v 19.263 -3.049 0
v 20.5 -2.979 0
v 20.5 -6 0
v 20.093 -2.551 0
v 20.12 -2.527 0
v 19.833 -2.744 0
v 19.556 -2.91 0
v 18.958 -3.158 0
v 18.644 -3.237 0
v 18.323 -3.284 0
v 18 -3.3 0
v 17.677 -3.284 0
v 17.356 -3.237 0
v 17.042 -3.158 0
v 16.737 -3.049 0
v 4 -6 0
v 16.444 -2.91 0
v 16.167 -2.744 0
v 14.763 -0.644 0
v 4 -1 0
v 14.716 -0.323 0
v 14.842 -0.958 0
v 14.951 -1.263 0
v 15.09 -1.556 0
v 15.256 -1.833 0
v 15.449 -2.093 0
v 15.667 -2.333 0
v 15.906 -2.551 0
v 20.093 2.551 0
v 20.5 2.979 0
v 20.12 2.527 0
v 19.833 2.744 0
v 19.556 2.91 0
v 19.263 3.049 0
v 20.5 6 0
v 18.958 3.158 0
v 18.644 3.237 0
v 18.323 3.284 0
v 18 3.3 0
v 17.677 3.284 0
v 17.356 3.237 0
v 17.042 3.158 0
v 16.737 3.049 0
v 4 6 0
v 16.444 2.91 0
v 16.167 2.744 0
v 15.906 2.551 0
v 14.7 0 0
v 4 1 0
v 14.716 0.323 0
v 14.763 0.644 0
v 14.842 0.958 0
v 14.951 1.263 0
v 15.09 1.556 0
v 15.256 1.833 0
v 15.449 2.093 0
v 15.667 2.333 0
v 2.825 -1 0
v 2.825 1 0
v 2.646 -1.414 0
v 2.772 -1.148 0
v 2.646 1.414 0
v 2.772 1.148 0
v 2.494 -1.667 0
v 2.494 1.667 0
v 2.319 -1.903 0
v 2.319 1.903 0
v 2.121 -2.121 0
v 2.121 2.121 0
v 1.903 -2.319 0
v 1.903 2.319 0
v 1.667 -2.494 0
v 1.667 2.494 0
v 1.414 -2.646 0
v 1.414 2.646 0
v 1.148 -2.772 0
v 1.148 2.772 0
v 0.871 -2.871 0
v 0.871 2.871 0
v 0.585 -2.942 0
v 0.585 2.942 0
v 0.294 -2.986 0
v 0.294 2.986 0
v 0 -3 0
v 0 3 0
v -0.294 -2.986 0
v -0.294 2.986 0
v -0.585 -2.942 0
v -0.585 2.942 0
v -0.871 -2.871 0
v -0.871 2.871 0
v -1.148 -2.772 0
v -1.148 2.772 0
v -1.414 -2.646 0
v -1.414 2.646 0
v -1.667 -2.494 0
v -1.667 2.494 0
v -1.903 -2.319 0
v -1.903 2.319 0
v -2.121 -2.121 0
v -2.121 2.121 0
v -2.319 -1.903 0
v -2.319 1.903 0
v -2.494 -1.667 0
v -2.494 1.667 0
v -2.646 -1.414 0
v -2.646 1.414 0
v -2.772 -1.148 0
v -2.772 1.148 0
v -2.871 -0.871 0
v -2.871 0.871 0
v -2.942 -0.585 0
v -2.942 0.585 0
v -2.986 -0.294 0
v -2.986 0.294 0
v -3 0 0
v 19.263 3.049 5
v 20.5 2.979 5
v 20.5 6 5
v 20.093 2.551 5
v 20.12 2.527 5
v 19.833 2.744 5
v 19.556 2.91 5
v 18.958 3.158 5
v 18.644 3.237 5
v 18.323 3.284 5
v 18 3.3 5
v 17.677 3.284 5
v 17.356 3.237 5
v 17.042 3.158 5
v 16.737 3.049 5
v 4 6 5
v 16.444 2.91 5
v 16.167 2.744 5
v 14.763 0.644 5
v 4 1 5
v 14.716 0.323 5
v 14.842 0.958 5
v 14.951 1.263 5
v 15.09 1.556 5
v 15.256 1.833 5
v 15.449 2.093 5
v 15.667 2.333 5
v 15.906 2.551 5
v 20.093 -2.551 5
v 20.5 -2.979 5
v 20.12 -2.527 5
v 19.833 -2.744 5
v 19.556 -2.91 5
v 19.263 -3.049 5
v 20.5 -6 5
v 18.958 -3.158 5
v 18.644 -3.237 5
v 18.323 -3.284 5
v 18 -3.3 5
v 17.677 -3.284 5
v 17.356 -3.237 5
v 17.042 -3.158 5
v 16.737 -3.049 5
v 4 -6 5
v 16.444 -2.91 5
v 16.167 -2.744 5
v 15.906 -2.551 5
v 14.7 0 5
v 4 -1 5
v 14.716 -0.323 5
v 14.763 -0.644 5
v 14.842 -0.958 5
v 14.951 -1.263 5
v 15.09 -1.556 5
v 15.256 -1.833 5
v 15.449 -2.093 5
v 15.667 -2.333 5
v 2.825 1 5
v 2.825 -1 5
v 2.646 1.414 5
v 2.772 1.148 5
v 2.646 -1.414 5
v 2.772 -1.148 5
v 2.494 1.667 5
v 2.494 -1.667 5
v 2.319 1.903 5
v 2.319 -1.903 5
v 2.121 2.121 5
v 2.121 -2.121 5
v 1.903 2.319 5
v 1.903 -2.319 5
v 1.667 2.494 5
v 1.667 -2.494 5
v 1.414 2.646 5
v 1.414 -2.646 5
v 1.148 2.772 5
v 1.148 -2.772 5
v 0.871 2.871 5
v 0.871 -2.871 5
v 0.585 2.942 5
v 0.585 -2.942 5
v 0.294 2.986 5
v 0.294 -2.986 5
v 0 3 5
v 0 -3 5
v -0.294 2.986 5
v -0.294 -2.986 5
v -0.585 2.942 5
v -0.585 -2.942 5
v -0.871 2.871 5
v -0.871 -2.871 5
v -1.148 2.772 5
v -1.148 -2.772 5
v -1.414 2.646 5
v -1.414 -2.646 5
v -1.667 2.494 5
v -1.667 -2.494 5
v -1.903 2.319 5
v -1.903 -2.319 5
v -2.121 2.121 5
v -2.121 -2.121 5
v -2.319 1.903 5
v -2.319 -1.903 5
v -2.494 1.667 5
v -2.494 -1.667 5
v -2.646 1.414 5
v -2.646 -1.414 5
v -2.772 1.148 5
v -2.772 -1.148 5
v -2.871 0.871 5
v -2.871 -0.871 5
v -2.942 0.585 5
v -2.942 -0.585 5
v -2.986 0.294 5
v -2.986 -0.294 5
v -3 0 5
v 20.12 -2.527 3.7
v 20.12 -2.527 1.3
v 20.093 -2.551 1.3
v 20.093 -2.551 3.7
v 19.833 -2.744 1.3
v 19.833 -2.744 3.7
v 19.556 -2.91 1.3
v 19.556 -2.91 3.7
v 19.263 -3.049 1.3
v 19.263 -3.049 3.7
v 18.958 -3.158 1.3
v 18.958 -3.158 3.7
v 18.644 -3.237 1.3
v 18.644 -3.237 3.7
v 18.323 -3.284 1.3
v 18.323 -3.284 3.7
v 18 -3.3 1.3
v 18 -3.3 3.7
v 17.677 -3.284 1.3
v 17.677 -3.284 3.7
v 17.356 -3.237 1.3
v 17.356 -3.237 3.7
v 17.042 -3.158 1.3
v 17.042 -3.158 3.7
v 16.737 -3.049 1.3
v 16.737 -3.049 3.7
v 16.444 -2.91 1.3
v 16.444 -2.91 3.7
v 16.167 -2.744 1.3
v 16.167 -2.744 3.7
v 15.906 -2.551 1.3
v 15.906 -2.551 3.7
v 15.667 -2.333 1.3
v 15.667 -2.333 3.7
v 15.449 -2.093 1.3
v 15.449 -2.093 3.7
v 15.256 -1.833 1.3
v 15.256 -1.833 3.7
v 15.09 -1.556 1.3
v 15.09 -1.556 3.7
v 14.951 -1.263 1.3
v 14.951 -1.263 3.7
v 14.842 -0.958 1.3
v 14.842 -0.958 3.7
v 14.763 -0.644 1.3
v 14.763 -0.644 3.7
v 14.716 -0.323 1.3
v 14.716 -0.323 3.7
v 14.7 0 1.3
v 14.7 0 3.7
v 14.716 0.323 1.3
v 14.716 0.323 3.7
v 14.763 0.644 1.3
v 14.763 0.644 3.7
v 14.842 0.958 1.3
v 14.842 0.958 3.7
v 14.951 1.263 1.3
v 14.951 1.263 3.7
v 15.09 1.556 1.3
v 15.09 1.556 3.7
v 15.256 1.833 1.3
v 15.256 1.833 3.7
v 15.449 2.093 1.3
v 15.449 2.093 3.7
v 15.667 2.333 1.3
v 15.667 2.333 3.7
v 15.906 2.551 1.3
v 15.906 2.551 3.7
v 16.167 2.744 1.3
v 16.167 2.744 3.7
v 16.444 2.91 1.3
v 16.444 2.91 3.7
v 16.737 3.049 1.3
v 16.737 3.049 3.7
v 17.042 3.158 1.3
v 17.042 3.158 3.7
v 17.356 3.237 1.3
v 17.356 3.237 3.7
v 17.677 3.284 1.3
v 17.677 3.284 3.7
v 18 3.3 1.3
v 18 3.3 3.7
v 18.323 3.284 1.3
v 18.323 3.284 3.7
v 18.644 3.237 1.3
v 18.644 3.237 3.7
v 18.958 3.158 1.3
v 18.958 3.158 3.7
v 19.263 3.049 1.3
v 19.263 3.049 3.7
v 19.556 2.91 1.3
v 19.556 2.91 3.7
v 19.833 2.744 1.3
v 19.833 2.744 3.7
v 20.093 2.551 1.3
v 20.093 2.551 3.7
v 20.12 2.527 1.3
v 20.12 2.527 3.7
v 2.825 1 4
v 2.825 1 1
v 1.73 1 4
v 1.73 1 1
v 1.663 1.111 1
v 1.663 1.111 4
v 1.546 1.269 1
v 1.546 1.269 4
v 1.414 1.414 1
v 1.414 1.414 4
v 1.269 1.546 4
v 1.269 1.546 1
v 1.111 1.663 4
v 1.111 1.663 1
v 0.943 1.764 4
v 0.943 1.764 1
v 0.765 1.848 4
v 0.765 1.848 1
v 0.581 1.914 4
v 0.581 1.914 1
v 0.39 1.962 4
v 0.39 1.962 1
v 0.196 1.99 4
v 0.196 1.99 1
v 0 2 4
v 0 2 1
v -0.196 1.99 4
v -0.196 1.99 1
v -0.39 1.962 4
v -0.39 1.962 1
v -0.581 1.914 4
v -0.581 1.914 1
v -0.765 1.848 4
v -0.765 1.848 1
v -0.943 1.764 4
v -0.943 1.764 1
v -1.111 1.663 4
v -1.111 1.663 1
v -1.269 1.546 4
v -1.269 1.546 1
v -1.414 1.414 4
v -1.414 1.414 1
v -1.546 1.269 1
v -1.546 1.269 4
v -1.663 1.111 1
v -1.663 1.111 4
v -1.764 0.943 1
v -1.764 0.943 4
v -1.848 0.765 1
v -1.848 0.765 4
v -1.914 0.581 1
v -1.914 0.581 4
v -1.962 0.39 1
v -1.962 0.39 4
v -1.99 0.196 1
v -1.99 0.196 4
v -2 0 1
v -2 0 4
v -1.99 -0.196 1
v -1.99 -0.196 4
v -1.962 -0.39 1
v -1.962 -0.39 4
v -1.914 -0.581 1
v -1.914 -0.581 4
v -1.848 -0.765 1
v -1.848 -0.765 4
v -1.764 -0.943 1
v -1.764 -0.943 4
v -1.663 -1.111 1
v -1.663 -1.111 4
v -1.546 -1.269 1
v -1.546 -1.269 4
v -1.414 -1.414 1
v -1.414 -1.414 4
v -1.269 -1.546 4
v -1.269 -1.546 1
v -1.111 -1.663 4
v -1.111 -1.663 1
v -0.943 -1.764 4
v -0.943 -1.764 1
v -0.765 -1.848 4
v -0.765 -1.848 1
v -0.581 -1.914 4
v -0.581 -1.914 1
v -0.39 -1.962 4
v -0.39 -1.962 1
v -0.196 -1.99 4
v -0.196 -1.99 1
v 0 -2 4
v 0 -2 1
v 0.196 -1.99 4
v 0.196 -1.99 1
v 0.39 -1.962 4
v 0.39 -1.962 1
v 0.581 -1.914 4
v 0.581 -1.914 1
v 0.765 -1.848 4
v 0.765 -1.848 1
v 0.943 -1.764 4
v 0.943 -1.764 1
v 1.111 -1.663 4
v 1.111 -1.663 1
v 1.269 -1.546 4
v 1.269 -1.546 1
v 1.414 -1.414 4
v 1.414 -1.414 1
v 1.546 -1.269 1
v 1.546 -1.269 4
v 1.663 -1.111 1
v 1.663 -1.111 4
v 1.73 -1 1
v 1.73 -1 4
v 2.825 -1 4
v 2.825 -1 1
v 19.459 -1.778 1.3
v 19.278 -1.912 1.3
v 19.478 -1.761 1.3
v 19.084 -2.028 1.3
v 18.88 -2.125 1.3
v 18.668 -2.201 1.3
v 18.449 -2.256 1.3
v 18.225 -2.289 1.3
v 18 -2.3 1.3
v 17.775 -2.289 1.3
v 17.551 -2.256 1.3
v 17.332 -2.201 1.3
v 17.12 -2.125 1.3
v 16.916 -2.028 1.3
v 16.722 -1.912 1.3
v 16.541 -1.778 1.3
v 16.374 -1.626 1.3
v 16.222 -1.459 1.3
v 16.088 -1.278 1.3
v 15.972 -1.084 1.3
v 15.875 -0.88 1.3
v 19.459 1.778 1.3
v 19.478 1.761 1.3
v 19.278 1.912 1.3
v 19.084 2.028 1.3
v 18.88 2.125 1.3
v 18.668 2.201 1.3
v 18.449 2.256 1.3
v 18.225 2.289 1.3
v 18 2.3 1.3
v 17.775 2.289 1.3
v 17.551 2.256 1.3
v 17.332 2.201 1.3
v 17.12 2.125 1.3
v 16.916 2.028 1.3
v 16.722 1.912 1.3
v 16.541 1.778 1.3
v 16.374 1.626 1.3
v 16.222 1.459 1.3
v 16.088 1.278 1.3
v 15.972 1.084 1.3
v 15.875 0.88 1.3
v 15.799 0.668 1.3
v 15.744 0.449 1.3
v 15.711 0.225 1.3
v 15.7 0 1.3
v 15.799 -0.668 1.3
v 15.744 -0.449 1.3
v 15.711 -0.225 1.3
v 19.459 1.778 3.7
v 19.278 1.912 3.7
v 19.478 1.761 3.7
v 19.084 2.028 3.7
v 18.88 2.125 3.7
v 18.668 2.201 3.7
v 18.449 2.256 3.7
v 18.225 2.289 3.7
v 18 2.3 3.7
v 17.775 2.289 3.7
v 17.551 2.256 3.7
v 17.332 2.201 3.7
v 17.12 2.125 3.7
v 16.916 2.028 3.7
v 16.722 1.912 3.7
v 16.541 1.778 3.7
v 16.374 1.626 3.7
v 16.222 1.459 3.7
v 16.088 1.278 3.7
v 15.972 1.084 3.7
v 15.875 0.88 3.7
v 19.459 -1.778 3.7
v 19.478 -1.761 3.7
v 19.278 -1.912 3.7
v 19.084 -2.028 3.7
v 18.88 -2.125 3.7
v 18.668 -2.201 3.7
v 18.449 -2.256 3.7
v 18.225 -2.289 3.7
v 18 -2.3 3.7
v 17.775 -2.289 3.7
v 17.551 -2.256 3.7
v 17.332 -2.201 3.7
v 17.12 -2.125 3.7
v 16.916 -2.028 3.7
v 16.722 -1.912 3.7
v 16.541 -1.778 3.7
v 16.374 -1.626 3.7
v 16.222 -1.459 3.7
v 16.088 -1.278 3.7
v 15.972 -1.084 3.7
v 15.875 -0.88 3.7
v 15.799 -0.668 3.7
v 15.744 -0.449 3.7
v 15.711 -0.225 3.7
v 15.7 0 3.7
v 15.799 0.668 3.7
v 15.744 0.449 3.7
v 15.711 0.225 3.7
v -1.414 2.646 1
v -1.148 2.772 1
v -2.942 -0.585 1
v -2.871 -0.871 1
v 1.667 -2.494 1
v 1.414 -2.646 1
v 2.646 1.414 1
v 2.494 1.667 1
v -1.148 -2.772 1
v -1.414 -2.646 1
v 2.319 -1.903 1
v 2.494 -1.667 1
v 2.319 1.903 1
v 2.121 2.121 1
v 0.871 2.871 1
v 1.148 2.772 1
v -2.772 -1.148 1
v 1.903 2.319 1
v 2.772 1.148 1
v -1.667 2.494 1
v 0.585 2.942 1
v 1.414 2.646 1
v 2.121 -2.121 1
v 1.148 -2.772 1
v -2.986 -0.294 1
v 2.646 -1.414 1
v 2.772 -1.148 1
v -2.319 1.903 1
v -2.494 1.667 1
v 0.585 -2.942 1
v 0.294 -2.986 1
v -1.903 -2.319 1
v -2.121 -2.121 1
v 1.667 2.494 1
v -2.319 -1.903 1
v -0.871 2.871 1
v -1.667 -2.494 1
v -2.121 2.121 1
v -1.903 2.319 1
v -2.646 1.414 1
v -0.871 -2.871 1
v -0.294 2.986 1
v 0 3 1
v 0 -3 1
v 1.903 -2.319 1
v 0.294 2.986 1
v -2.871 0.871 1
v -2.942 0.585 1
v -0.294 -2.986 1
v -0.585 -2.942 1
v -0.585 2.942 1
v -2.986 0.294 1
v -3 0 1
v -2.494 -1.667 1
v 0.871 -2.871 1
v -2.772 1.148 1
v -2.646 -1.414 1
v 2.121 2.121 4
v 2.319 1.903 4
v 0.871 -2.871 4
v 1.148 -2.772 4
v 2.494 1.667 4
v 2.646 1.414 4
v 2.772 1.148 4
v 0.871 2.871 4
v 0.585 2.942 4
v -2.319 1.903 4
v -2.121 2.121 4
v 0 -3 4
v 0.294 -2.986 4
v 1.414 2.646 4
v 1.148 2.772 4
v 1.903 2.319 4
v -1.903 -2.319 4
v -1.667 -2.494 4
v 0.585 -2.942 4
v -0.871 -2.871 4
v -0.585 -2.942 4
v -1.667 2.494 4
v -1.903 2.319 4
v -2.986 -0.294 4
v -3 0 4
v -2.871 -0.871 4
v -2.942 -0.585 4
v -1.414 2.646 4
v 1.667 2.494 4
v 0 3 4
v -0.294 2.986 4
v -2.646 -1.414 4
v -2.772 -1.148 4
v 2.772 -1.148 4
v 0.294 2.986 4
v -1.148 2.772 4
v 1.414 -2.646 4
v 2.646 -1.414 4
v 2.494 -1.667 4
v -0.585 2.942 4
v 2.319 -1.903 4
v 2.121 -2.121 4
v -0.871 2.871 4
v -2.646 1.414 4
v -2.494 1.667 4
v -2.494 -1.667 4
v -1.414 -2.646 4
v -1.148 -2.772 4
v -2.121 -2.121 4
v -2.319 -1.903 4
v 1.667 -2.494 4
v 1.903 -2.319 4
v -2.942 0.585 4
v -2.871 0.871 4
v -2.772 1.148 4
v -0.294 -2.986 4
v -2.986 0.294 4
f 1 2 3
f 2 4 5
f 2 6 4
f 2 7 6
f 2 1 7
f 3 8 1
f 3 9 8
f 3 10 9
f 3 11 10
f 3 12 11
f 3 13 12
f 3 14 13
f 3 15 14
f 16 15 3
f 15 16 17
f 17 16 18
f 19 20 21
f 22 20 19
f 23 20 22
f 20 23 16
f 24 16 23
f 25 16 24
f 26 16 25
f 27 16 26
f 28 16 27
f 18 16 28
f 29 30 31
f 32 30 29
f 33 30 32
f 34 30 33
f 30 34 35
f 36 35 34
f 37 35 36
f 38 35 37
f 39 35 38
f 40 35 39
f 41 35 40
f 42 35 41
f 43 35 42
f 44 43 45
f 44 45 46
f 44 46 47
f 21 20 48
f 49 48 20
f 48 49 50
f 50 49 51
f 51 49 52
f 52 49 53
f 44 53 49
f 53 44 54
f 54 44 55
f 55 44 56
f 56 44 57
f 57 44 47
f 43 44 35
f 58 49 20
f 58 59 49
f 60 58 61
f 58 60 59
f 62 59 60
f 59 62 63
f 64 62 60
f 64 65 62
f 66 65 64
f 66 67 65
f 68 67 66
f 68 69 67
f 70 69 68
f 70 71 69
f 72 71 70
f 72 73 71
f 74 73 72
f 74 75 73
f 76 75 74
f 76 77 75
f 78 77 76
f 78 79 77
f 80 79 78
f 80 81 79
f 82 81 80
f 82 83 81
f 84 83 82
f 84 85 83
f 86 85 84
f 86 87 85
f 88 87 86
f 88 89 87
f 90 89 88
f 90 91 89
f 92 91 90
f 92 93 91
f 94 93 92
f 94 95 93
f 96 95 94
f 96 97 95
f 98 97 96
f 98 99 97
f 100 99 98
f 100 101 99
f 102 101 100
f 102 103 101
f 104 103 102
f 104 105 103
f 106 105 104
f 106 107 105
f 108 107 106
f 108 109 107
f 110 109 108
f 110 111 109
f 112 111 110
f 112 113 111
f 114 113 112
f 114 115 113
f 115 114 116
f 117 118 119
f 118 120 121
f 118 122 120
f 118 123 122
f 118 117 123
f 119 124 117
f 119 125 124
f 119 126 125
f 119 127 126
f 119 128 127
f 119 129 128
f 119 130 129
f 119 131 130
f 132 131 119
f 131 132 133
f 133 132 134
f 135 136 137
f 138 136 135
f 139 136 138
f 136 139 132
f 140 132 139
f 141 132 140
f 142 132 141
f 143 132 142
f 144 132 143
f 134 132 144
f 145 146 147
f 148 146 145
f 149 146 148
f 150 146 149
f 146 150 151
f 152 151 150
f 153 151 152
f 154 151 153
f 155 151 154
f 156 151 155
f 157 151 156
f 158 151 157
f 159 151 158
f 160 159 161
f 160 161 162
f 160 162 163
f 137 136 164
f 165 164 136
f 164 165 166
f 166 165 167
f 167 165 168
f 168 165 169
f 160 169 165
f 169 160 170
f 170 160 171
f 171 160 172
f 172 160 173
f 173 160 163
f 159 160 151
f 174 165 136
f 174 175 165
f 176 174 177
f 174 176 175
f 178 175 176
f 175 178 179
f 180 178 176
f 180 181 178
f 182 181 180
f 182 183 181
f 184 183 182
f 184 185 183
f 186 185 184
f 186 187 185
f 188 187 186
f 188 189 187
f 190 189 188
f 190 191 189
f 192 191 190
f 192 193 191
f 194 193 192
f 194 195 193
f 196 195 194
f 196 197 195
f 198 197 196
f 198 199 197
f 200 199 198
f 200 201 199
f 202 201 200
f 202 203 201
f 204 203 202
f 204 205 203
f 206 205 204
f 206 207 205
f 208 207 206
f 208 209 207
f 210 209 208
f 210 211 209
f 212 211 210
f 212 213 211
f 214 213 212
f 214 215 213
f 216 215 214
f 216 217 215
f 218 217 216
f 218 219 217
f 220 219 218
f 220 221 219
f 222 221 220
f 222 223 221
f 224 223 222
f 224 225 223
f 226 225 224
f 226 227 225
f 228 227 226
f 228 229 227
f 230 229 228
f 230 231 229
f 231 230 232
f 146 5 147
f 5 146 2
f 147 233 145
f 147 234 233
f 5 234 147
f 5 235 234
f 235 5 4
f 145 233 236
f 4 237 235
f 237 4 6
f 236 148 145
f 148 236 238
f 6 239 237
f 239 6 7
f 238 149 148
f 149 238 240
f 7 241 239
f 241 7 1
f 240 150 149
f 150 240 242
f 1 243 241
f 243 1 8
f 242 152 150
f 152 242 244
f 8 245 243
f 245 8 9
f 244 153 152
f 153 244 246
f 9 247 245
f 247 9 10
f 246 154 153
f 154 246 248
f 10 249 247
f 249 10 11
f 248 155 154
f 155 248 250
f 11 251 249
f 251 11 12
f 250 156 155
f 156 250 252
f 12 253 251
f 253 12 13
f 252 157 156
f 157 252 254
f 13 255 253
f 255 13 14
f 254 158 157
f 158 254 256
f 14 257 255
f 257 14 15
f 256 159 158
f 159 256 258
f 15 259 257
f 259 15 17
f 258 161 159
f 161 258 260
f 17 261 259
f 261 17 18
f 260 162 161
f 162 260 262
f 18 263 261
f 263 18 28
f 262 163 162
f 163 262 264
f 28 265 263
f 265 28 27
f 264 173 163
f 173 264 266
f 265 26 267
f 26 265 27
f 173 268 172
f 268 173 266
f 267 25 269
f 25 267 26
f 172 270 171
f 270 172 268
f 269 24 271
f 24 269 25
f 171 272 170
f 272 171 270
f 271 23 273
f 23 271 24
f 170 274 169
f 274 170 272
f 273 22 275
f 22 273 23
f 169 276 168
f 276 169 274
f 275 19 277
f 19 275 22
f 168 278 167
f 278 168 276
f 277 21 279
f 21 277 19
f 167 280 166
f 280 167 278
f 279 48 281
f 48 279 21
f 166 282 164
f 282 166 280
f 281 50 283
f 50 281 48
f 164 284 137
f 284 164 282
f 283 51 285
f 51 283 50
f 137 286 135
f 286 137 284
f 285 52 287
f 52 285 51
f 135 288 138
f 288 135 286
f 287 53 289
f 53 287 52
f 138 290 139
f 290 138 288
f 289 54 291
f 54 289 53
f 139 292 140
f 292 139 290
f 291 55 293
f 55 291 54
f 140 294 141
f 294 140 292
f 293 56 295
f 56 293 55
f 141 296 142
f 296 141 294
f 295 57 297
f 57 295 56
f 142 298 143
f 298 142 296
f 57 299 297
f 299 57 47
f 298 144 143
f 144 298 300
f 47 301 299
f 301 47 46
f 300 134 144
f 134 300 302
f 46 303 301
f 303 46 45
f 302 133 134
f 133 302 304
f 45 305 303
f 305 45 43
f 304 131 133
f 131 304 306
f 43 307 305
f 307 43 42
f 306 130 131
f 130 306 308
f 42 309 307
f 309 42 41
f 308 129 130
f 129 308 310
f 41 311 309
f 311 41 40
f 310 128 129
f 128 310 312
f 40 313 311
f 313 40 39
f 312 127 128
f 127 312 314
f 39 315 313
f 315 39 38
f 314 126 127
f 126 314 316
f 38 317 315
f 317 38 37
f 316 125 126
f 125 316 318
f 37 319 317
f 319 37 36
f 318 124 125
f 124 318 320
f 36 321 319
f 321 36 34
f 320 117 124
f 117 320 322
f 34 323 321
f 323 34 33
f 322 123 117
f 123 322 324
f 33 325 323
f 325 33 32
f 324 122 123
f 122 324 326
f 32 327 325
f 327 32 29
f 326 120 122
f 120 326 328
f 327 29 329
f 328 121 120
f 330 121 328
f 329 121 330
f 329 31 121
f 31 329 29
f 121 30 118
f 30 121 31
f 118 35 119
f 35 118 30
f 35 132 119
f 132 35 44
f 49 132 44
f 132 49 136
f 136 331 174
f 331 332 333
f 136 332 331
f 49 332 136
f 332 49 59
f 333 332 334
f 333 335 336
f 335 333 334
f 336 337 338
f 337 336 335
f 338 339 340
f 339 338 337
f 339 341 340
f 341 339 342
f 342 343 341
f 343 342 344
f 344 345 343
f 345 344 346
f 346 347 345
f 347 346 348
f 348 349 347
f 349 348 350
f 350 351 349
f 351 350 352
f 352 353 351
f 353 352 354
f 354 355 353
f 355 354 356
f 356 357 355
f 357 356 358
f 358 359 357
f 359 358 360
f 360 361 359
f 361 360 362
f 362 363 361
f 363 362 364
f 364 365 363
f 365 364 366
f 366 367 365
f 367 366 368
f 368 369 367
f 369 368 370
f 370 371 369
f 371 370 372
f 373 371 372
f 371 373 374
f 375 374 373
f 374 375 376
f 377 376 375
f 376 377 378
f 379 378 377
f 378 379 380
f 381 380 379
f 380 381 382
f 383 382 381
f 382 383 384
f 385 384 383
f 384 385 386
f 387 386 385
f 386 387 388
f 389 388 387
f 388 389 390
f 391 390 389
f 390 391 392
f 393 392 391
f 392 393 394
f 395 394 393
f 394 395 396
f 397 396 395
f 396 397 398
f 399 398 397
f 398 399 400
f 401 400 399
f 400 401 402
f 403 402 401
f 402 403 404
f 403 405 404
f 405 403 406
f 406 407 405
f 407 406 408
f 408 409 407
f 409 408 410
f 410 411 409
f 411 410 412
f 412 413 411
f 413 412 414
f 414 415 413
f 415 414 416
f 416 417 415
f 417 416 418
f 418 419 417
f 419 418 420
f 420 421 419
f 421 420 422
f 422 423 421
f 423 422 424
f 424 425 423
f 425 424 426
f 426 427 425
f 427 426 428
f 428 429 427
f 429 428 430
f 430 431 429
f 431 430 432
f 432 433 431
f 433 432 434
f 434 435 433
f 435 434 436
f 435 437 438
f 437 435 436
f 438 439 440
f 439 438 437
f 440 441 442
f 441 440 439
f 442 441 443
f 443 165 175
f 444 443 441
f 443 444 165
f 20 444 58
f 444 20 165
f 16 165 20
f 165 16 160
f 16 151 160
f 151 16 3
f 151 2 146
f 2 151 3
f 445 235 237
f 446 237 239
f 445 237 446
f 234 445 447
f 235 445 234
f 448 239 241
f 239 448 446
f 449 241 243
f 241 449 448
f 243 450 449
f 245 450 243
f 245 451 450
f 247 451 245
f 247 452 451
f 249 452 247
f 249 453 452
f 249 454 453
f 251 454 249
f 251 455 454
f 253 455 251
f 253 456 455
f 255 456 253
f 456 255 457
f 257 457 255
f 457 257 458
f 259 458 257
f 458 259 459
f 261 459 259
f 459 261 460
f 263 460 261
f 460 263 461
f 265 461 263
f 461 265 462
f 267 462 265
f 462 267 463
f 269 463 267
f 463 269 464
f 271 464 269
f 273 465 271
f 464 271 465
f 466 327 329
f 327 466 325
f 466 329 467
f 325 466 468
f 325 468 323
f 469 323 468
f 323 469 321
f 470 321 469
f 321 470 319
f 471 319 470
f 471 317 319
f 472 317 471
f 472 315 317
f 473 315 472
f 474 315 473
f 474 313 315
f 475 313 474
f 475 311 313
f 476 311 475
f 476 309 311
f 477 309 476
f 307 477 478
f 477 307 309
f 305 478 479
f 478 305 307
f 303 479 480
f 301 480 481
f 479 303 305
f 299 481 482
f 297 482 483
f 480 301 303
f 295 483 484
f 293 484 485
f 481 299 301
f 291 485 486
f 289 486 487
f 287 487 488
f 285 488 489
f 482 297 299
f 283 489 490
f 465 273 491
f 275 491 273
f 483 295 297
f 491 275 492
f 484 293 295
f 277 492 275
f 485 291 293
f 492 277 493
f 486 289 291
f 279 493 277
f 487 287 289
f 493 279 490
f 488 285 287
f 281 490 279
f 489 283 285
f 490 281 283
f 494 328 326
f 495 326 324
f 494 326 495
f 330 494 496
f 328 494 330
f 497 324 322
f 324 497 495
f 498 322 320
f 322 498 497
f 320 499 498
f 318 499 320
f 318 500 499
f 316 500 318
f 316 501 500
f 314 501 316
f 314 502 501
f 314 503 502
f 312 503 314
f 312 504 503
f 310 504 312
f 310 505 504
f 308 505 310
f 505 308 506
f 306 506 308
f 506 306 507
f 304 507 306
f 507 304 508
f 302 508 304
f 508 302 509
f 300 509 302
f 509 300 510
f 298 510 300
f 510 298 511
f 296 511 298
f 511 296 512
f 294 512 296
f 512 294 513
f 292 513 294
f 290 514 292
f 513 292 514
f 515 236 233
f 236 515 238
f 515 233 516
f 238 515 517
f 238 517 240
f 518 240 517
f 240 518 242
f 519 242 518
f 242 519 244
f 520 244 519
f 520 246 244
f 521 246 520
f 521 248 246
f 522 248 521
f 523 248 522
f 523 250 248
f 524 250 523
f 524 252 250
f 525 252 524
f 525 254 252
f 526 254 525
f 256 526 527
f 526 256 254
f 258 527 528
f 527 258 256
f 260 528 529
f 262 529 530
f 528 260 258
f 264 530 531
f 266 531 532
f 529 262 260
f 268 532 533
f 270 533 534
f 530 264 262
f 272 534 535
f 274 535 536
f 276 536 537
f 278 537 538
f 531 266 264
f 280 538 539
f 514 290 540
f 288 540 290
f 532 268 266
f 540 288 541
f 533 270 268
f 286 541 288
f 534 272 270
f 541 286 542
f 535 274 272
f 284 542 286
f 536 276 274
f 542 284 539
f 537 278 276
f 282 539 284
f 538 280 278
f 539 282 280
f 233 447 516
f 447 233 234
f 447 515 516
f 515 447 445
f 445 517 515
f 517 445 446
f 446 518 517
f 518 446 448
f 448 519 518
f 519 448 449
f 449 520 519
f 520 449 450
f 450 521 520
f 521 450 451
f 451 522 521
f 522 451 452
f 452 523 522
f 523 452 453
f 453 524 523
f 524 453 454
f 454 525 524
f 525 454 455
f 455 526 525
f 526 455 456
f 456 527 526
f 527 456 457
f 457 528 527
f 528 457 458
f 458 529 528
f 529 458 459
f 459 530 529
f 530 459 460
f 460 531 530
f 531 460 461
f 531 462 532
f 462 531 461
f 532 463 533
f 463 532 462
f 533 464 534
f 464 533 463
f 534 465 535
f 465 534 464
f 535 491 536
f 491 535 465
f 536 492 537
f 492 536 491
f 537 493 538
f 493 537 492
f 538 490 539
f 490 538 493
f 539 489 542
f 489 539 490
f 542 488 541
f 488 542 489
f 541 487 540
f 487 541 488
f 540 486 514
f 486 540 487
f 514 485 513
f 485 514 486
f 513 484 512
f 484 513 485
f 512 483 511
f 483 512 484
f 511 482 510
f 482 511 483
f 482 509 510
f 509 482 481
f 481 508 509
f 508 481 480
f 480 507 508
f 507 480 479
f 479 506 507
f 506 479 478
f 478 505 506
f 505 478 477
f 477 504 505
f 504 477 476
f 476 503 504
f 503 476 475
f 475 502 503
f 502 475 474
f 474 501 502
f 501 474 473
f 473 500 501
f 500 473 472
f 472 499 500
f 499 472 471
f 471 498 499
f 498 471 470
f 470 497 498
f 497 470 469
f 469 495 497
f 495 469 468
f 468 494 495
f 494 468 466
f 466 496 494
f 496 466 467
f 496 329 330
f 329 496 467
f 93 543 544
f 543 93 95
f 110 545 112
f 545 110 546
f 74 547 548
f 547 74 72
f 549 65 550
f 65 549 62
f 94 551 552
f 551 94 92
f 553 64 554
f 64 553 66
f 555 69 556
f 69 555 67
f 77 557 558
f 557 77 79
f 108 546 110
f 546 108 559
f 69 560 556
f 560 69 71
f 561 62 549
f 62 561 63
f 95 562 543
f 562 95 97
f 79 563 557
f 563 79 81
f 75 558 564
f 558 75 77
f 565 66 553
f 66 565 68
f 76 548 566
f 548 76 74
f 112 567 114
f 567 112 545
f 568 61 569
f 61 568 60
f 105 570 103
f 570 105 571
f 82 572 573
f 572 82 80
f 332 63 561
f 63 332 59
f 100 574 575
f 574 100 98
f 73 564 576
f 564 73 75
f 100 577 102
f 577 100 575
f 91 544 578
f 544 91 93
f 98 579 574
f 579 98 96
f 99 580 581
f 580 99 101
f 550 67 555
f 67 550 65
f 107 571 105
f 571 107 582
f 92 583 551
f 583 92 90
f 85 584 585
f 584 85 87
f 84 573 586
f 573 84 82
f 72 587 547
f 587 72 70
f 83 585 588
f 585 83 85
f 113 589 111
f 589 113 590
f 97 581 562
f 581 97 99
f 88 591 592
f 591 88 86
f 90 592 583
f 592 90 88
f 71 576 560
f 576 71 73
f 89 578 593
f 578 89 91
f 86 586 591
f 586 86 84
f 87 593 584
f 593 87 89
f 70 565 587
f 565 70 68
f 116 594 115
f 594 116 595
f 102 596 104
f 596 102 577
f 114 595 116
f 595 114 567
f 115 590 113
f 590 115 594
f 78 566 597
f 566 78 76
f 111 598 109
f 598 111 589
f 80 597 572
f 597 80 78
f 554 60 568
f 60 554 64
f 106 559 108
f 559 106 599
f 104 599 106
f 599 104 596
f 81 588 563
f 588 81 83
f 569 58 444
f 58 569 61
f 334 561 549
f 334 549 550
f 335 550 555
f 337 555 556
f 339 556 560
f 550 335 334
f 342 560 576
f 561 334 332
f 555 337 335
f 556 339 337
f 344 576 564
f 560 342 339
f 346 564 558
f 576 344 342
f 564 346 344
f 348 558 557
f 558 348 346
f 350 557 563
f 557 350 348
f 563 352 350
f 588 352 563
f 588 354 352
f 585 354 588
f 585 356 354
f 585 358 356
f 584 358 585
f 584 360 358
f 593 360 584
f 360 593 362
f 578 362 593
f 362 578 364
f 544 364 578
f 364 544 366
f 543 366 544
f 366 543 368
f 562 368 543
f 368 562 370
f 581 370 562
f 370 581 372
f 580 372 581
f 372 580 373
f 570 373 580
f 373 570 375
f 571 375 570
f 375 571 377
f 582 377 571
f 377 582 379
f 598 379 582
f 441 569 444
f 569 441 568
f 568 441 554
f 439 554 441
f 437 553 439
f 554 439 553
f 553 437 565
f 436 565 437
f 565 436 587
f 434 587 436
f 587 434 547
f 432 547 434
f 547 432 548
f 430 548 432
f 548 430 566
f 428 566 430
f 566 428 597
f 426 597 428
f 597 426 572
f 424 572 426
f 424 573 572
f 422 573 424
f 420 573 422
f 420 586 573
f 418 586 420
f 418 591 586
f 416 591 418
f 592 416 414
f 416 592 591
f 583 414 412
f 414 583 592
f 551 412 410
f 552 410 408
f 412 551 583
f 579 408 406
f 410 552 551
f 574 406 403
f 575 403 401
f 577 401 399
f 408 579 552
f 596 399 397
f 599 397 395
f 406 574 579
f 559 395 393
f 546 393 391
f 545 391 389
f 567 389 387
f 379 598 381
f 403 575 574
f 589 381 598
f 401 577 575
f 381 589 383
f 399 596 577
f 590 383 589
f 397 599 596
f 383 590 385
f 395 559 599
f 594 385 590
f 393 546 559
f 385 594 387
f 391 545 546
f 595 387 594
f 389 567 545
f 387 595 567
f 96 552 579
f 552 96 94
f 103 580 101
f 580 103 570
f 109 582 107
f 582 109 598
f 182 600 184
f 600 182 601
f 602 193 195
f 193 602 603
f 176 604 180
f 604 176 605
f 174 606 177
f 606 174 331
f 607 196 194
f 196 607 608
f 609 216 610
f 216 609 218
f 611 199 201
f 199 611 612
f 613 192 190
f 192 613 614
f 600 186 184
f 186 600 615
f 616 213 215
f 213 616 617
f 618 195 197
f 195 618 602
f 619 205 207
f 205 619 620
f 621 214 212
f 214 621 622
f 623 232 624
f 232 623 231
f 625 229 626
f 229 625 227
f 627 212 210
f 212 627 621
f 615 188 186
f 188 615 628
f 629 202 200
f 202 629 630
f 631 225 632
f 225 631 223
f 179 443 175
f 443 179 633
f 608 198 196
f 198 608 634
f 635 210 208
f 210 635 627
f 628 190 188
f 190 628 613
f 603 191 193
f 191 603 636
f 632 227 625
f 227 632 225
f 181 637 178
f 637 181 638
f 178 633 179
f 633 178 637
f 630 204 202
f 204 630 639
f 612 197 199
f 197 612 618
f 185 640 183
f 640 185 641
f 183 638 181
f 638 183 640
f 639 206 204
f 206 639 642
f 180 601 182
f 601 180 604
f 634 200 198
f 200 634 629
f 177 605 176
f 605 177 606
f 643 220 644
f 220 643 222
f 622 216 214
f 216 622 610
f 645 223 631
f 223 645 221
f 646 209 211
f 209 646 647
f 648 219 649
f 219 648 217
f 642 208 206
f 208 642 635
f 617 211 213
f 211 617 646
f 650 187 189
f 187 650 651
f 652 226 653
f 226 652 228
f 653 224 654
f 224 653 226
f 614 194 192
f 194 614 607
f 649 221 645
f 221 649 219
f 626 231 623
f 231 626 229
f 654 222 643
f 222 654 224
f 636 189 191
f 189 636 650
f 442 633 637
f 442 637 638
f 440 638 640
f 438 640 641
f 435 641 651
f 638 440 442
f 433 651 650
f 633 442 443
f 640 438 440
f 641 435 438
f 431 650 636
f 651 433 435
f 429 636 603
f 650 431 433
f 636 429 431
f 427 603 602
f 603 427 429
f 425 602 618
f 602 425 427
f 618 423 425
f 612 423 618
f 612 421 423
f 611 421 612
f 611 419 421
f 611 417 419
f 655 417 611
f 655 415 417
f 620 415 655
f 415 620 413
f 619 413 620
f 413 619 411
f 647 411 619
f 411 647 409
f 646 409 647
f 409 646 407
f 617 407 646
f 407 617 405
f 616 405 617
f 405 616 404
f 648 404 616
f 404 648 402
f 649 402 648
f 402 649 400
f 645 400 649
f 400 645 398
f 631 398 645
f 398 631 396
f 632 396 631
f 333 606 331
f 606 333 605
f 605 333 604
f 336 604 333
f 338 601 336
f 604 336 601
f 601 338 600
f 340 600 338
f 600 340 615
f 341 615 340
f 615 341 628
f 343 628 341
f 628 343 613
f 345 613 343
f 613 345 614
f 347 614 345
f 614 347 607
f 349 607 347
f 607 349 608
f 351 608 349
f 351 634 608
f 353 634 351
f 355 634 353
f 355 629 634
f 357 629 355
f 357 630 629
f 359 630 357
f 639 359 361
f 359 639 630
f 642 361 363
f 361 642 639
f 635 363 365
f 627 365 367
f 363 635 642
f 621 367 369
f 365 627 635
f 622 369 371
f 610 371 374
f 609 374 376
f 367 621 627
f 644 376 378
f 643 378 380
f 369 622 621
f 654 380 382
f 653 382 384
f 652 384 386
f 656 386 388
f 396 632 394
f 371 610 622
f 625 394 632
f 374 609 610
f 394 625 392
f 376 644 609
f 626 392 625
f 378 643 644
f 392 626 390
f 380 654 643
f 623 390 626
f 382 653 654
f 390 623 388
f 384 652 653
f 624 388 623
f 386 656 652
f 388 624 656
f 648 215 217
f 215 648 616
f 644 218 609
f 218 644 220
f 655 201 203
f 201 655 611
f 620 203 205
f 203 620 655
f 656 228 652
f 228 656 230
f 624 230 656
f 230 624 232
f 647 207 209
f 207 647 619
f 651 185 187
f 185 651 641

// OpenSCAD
part = "link"; // [link, assembly]
cadverify_only = "";
module instance(name, part, unit = 1) {
    echo(cadverify_instance = [name, part, unit]);
    if (cadverify_only == "" || cadverify_only == name) children();
}

// Parameters (mm)
pitch = 18;          // pin-to-bore distance
link_w = 12;         // width (Y)
link_t = 5;          // thickness (Z)
pin_d = 4;           // pin shaft diameter
bore_d = 4.6;        // bore diameter (0.3 radial clearance)
cap_d = 6;           // cap diameter
cap_h = 1;           // cap thickness
gap_z = 0.3;         // vertical clearance cap<->knuckle
kn_h = 2.4;          // knuckle height = 5-2*1-2*0.3
kn_out_d = 7.6;      // knuckle outer diameter (1.5 wall)
cap_cav_d = 6.6;     // cap cavity diameter (0.3 radial clearance)
neck_w = 2;          // neck width
slot_half = 50;      // slot half-angle (deg), allows +-30 deg swing
yoke_east = 20.5;    // full-height yoke east extent (local X)
$fn = 64;

module link_geom() {
    bore_x = pitch;
    cap_r = cap_d/2;
    cav_r = cap_cav_d/2;
    pin_r = pin_d/2;
    bore_r = bore_d/2;
    kn_out_r = kn_out_d/2;
    // far points for slot wedge (full height + middle)
    // wedge from bore center to the east, half-angle slot_half
    wedge_far = 30;
    dy_far = wedge_far * tan(slot_half);
    // ---- full height (0..5): yoke + neck + pin shaft ----
    linear_extrude(height = link_t, convexity = 8) {
        difference() {
            union() {
                // pin shaft disc
                translate([0,0]) circle(r = pin_r);
                // neck rect X[0,5] Y[-1,1]
                translate([0,-neck_w/2]) square([5, neck_w]);
                // yoke base rect X[4,yoke_east] Y[-6,6]
                translate([4,-link_w/2]) square([yoke_east-4, link_w]);
            }
            // cap cavity (for next link caps)
            translate([bore_x,0]) circle(r = cav_r);
            // slot wedge for next-link neck swing (full height)
            polygon(points = [[bore_x,0],[bore_x+wedge_far, dy_far],[bore_x+wedge_far, -dy_far]]);
        }
    }
    // ---- middle knuckle ring (1.3..3.7) ----
    kn_bot = cap_h + gap_z; // 1.3
    translate([0,0,kn_bot])
    linear_extrude(height = kn_h, convexity = 8) {
        difference() {
            translate([bore_x,0]) circle(r = kn_out_r);
            translate([bore_x,0]) circle(r = bore_r);
            polygon(points = [[bore_x,0],[bore_x+wedge_far, dy_far],[bore_x+wedge_far, -dy_far]]);
        }
    }
    // ---- caps ----
    translate([0,0,0]) cylinder(h = cap_h, r = cap_r);
    translate([0,0,link_t-cap_h]) cylinder(h = cap_h, r = cap_r);
}

if (part == "assembly") {
    instance("link1", "link", 1) translate([0,0,0]) link_geom();
    instance("link2", "link", 1) translate([18,0,0]) link_geom();
    instance("link3", "link", 1) translate([36,0,0]) link_geom();
    echo(cadverify_spec = [
        ["bounds", [[-3, -6, 0], [56.5, 6, 5]]],
        ["support_faces", [["bed", "-z", 200]]],
        ["motions", [
            ["bend", ["link3"], "rotate", [36, 0, 0], [0, 0, 1], [-30, 30]]
        ]],
        ["assembly_order", [
            [["link1", "link2", "link3"], [0, 0, 0]]
        ]],
        ["print_in_place", 0.3],
        ["overhangs_allowed", [
            ["pin cap link1", [[-3, -3, 3.8], [3, 3, 4.2]]],
            ["knuckle joint1", [[14.5, -3.5, 1.0], [21, 3.5, 1.5]]],
            ["pin cap link2", [[15, -3, 3.8], [21, 3, 4.2]]],
            ["knuckle joint2", [[32.5, -3.5, 1.0], [39, 3.5, 1.5]]],
            ["pin cap link3", [[33, -3, 3.8], [39, 3, 4.2]]],
            ["knuckle end", [[50.5, -3.5, 1.0], [57, 3.5, 1.5]]]
        ]],
        ["held", ["link1", "link2", "link3"]]
    ]);
} else {
    link_geom();
    echo(cadverify_spec = [
        ["bounds", [[-3, -6, 0], [20.5, 6, 5]]],
        ["bodies", 1],
        ["through_holes", 0],
        ["support_faces", [["bed", "-z", 100]]],
        ["overhangs_allowed", [
            ["pin cap", [[-3, -3, 3.8], [3, 3, 4.2]]],
            ["knuckle ceiling", [[14.5, -3.5, 1.0], [21, 3.5, 1.5]]]
        ]],
        ["copies", 3],
        ["details", [
            ["body", "material", [[4, -6, 0], [14, 6, 5]], 0.85],
            ["neck", "material", [[0, -1, 0], [5, 1, 5]], 0.8],
            ["knuckle", "material", [[14.2, -3.8, 1.3], [21.8, 3.8, 3.7]], 0.25],
            ["slot", "void", [[19, -1, 0], [21, 1, 5]], 0.8],
            ["cap_cavity", "void", [[14.7, -3.3, 0], [21.3, 3.3, 1]], 0.5],
            ["wall", "thickness", [18, 7, 2.5], [0, -1, 0], 1.5],
            ["floor", "thickness", [9, 0, -1], [0, 0, 1], 5]
        ]]
    ]);
}
